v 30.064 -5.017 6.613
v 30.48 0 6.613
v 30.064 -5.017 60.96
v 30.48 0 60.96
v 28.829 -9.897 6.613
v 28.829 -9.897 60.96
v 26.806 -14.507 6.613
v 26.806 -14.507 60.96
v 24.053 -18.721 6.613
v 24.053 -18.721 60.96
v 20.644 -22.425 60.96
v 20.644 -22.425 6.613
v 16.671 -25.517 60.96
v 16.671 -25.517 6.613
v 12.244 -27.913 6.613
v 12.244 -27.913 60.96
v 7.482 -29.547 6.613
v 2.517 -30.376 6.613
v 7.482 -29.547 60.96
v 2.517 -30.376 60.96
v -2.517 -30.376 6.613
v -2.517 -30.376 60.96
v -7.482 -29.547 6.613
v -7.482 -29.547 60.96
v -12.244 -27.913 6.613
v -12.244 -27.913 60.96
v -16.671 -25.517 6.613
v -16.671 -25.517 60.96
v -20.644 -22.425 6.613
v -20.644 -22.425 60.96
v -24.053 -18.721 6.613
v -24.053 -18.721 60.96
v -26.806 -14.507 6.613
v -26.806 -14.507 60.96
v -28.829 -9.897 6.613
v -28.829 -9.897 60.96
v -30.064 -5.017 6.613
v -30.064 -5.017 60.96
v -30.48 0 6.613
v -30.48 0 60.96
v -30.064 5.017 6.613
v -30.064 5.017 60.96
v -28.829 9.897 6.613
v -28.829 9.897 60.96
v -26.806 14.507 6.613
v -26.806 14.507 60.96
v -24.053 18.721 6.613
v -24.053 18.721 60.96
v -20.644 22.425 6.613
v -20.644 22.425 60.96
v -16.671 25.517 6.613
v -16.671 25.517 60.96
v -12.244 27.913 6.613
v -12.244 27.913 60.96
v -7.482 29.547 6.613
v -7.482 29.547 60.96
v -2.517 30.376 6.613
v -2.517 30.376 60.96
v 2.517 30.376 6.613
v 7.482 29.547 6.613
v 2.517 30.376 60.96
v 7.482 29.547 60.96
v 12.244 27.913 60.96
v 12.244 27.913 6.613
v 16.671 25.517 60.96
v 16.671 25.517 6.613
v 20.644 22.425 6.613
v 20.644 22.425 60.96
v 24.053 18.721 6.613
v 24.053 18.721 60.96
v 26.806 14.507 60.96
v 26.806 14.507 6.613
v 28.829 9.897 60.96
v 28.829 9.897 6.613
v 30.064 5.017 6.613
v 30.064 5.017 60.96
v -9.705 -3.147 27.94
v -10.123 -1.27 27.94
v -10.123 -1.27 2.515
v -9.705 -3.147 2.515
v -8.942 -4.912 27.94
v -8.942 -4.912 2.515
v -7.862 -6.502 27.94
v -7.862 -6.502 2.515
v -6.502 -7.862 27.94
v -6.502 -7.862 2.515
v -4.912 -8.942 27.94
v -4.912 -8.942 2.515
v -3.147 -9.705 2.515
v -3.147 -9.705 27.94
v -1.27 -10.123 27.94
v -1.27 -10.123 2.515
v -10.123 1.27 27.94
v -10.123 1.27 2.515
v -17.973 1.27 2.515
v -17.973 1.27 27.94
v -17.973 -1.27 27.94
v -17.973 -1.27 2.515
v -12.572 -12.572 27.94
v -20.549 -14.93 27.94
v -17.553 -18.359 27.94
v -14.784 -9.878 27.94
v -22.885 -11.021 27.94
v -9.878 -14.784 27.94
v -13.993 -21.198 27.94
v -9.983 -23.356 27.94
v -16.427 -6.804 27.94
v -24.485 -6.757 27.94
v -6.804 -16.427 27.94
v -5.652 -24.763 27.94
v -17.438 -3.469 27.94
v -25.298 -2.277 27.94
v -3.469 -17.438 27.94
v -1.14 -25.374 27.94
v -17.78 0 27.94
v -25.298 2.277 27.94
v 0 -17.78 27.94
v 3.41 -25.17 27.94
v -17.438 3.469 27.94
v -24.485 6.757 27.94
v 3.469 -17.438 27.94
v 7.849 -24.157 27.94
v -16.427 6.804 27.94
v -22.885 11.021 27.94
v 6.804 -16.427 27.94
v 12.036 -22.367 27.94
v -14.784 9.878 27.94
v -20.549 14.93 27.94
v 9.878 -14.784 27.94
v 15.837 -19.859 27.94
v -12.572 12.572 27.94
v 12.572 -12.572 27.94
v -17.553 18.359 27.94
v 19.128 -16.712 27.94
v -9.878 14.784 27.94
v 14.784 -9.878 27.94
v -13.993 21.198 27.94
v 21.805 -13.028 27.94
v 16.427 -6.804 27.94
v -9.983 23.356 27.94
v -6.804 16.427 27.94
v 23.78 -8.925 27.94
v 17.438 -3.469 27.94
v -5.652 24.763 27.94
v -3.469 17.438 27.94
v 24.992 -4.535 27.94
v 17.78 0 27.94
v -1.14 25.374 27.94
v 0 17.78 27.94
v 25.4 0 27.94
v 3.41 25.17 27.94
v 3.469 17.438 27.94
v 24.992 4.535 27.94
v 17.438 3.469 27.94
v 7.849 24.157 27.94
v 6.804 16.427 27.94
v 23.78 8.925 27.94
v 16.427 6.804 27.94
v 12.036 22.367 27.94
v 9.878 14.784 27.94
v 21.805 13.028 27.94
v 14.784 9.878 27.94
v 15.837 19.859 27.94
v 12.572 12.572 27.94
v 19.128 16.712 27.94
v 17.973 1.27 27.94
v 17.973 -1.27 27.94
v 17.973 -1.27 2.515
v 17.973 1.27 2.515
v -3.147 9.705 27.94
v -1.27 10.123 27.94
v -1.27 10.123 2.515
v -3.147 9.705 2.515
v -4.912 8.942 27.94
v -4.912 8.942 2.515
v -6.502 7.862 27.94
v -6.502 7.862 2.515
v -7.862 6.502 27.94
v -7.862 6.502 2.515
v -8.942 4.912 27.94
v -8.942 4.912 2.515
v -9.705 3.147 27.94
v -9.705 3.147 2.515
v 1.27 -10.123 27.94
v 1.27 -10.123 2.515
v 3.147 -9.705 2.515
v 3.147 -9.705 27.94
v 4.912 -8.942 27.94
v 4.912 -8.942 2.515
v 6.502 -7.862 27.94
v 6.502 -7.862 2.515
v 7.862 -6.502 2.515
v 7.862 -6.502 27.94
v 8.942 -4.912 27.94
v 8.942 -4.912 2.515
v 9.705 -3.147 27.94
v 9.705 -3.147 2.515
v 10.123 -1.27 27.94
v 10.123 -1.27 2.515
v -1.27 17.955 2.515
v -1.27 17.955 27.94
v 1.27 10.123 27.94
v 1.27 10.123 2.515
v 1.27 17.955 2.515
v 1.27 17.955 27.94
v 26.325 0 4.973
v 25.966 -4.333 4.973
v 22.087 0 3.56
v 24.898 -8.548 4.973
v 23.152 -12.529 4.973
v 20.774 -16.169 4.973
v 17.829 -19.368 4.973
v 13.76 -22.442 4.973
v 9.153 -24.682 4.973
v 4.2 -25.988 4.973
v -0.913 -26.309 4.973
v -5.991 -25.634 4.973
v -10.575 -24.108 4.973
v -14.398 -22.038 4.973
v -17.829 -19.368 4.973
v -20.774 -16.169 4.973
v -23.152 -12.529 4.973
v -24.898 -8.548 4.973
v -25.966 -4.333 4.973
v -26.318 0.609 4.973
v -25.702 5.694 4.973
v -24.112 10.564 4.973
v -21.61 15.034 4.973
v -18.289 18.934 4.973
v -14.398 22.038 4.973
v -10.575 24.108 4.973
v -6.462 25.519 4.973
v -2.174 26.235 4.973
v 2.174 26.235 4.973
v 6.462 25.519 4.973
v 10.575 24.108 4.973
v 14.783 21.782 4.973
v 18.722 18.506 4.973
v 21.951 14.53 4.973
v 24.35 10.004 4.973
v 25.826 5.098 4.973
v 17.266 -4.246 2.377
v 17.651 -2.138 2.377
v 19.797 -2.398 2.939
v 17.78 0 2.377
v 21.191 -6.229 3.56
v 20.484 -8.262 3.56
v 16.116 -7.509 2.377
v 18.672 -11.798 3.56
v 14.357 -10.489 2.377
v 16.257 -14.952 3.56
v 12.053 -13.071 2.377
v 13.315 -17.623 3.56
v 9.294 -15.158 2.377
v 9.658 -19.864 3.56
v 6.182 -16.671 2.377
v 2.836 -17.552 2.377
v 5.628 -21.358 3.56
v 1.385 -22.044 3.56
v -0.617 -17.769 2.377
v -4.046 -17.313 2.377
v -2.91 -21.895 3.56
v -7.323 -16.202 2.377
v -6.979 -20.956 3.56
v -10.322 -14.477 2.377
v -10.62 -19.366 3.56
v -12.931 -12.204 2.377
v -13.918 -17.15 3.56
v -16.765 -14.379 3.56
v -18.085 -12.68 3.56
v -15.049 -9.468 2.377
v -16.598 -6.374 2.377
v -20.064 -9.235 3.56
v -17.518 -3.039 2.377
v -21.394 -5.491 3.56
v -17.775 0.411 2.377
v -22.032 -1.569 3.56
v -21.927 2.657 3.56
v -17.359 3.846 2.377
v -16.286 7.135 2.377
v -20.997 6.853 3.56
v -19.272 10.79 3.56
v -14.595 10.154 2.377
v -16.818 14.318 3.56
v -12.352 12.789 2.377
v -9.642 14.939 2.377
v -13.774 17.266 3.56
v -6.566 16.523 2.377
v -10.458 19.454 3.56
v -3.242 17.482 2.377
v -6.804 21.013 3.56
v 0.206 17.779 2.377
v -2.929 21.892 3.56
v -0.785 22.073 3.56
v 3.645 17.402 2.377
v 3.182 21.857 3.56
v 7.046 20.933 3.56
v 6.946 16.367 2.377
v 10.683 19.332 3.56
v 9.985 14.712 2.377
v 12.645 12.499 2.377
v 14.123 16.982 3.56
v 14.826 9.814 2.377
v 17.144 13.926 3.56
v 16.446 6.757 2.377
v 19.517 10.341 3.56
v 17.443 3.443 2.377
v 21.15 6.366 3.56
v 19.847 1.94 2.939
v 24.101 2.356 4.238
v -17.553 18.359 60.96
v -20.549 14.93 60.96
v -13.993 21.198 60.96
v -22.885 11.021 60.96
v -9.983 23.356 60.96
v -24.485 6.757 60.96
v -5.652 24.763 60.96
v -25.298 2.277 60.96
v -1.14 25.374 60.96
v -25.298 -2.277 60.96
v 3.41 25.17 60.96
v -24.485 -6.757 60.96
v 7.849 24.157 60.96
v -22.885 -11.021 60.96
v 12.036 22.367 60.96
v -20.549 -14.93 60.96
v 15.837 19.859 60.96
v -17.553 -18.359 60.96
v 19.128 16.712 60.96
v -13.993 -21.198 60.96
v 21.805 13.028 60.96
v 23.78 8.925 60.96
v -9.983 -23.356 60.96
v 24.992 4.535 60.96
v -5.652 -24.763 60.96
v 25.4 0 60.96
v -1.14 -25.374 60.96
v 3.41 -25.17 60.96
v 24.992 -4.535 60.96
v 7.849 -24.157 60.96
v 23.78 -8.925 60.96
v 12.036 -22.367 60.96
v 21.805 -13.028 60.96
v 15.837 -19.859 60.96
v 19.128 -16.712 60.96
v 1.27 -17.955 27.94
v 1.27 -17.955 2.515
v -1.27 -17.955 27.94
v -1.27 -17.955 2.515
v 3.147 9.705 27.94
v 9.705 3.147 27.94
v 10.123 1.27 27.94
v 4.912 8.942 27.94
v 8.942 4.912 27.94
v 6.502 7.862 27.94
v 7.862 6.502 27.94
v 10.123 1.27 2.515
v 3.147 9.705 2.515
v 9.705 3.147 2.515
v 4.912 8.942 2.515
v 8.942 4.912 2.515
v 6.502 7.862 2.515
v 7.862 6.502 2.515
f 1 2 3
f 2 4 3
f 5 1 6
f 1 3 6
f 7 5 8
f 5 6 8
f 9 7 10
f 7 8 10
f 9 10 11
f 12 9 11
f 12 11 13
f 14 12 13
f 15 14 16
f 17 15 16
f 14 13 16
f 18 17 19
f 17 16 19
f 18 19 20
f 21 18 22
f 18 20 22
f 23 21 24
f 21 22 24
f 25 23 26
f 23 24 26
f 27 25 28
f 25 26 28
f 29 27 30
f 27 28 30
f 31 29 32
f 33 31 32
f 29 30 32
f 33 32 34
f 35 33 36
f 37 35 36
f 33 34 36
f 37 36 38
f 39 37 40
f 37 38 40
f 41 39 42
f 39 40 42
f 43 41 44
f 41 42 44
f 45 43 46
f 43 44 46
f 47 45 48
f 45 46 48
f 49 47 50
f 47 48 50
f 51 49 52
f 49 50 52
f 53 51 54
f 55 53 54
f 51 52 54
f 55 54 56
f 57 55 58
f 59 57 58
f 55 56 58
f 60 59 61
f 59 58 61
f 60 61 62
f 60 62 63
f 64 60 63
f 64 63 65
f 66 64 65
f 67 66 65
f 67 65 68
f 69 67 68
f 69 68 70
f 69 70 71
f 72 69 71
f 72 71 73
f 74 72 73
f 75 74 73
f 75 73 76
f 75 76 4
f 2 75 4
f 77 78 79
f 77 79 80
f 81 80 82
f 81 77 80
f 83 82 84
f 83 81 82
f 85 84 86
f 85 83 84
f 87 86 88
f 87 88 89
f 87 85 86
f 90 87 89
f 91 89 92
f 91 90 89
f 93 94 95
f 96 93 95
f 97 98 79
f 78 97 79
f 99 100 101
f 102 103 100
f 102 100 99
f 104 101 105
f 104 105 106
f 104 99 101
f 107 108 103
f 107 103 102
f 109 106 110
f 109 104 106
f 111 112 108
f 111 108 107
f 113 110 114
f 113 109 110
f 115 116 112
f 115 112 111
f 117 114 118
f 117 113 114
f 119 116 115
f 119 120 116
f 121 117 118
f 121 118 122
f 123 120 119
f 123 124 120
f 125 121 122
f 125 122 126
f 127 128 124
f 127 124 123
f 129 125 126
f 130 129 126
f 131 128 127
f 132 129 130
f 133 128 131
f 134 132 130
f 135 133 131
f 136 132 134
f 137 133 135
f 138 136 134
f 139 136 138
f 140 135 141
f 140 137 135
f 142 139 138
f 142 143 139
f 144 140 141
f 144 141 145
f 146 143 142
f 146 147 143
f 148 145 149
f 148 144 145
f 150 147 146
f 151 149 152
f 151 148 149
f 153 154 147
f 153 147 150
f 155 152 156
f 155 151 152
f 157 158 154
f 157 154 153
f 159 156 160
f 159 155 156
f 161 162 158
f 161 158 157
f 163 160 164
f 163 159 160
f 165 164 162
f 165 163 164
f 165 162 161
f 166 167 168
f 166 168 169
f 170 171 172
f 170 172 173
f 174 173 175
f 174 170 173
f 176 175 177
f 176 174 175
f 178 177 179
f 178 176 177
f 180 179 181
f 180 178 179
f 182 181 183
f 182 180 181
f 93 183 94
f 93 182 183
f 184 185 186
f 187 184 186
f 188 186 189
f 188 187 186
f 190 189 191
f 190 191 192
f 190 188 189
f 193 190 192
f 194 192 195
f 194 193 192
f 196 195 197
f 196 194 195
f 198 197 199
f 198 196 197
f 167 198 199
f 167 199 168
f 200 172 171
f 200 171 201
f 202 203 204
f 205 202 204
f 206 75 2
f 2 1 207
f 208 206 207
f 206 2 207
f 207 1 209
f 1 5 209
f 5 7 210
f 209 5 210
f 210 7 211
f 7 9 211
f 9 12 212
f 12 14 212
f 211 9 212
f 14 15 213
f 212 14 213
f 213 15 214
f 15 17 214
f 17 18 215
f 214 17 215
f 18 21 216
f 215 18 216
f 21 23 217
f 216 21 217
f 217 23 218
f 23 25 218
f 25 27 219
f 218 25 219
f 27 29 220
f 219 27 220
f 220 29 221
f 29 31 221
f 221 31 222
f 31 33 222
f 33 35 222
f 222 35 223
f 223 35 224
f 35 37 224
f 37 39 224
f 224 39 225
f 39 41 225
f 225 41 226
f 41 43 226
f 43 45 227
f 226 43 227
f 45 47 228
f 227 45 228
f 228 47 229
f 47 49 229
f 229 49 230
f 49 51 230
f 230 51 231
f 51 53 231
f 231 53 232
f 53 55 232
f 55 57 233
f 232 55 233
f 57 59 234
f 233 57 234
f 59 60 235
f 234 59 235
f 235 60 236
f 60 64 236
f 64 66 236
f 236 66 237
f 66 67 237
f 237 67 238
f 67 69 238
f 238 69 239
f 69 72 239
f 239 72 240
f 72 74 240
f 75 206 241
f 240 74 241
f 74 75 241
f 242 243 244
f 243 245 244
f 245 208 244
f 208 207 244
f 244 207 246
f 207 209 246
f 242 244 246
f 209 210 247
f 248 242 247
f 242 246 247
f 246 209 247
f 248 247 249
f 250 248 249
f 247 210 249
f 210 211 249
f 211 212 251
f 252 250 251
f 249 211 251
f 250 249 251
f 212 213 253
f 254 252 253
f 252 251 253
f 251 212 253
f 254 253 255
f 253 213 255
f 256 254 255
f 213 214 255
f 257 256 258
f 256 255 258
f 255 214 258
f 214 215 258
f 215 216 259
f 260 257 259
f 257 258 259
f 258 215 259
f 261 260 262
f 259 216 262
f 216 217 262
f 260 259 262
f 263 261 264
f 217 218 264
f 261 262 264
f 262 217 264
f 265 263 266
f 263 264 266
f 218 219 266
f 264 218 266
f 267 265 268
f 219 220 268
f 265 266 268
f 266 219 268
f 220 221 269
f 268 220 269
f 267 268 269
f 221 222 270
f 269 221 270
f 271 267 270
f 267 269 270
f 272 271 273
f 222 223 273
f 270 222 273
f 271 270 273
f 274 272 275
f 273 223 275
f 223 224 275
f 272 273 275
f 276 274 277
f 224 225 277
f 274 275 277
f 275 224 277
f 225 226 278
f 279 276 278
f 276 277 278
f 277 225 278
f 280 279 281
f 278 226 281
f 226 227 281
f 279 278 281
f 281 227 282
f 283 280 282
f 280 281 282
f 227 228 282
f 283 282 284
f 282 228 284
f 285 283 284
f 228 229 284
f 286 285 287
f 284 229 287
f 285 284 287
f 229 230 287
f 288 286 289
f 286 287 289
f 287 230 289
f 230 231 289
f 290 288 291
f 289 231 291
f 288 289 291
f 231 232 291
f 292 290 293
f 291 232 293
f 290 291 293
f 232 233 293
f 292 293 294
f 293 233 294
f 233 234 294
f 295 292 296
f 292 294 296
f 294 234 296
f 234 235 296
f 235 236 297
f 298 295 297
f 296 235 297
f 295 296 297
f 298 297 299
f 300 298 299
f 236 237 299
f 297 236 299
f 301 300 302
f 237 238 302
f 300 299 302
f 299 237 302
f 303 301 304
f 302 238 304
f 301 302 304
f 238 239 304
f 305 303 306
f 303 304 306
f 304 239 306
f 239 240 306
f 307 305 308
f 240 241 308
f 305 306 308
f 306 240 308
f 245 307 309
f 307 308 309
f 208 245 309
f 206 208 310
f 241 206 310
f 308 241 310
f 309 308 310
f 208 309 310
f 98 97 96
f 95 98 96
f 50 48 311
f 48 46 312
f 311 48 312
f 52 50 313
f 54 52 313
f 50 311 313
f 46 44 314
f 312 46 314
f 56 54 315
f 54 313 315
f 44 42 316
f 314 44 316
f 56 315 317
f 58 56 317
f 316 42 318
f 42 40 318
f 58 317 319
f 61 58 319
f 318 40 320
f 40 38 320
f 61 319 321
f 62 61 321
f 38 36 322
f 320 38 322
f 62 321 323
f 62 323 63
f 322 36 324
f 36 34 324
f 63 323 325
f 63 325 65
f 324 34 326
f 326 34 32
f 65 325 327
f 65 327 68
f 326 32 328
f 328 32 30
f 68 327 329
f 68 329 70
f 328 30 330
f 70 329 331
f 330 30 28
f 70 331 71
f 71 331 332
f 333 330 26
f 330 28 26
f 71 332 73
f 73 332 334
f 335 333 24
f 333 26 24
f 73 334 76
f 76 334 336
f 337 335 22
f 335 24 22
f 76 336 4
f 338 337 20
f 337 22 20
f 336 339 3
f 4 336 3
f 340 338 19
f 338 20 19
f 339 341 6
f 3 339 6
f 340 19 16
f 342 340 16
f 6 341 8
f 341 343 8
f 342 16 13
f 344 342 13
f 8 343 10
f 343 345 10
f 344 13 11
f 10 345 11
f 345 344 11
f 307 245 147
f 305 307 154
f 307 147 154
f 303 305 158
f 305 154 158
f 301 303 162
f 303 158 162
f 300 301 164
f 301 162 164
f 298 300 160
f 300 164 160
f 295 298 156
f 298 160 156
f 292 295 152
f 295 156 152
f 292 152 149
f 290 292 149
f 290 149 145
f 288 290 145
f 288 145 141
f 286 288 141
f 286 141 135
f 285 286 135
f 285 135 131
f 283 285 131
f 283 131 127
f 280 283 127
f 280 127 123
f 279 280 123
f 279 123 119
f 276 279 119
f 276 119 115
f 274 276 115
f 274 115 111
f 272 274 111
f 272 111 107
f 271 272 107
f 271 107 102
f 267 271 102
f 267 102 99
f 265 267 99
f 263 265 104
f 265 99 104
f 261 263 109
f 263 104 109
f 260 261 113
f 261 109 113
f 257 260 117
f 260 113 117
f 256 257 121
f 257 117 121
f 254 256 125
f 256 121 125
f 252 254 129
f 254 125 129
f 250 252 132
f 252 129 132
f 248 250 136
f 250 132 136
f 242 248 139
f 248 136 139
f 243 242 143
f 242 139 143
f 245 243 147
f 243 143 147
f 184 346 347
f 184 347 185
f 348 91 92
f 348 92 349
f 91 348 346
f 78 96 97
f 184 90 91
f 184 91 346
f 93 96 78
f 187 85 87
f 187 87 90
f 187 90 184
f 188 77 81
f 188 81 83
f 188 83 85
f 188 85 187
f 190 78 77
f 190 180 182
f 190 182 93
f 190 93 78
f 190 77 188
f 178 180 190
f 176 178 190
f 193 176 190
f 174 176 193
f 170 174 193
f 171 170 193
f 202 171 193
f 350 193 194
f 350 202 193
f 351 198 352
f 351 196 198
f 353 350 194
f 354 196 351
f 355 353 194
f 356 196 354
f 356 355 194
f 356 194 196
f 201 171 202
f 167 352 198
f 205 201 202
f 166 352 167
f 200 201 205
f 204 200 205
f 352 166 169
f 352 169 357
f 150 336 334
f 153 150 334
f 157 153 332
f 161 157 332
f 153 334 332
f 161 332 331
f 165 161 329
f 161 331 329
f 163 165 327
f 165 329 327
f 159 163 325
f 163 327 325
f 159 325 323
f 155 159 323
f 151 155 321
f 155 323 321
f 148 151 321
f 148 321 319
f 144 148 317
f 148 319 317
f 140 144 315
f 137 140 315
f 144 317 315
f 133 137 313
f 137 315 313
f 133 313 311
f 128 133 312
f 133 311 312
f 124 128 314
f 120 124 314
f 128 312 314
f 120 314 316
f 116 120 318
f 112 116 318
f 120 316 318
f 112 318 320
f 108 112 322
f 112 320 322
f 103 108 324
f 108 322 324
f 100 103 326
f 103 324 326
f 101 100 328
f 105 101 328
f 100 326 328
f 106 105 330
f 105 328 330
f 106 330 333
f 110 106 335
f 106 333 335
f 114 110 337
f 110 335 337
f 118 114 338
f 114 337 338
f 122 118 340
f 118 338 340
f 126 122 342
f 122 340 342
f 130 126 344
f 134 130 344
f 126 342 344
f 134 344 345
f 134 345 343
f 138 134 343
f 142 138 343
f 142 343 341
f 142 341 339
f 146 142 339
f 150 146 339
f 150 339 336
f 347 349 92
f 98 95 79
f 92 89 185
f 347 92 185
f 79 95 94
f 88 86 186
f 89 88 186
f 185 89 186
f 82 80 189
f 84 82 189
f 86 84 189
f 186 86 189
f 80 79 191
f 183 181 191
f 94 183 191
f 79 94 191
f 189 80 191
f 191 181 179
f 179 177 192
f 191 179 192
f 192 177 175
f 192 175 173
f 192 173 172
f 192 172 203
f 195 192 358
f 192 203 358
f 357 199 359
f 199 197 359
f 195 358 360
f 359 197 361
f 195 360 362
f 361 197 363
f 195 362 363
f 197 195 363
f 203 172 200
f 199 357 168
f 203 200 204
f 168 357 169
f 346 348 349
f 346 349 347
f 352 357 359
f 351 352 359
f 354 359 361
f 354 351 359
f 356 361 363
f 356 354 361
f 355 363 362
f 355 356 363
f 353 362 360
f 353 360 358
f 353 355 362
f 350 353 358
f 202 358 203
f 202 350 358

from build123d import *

# Parameters (mm, degrees)
F2_R     = 25.4
F2_R_2   = 17.78
F3_DEPTH = 33.02
F4_DEPTH = 60.96
F5_W     = 2.54
F5_H     = 16.6851995905
F5_H_2   = 2.54
F5_W_2   = 16.7025072155
F6_DEPTH = 25.4254
F8_DEPTH = 25.4254


# Not quite as in the source:
# - a feature names something its author has since deleted; it is built from what else it names


with BuildPart() as f1:
    # F0 (on Front) → F1 (revolve)
    with BuildSketch(Plane.XZ):
        with BuildLine():
            Line((30.48, 60.96), (0, 60.96))
            Line((0, 60.96), (0, 0))
            ThreePointArc((0, 0), (15.5534533119, 1.861565962), (30.48, 6.6127281069))
            Line((30.48, 6.6127281069), (30.48, 60.96))
        make_face()
    revolve(axis=Axis((0, 0, 30.48), (0, 0, -1)))

    # F2 (on face) → F3 (cut)
    with BuildSketch(Plane.XY.offset(60.96)):
        Circle(F2_R)
        Circle(F2_R_2, mode=Mode.SUBTRACT)
    extrude(amount=-F3_DEPTH, mode=Mode.SUBTRACT)

    # F4 (cut): a face of the model
    f4_faces = [f1.faces().sort_by_distance(p)[0] for p in [
        (0, 0, 60.96),
    ]]
    extrude(f4_faces, amount=-F4_DEPTH, mode=Mode.SUBTRACT)


with BuildPart() as f6:
    # F5 (on face) → F6 (new body)
    with BuildSketch(Plane.XY.offset(27.94)):
        with Locations((0, -9.6125997952)):
            Rectangle(F5_W, F5_H)
        Rectangle(F5_W, F5_H_2)
        with Locations((9.6212536077, 0)):
            Rectangle(F5_W_2, F5_H_2)
        with Locations((-9.6212536077, 0)):
            Rectangle(F5_W_2, F5_H_2)
        with Locations((0, 9.6125997952)):
            Rectangle(F5_W, F5_H)
    extrude(amount=-F6_DEPTH)

    # F7 (on face) → F8 (join)
    with BuildSketch(Plane.XY.offset(27.94)):
        with BuildLine():
            ThreePointArc((0, -10.2025506097), (7.2142927215, -7.2142927215), (10.2025506097, 0))
            ThreePointArc((10.2025506097, 0), (-7.2142927215, 7.2142927215), (0, -10.2025506097))
        make_face()
    extrude(amount=-F8_DEPTH)


solid = Compound([f1.part, f6.part])
